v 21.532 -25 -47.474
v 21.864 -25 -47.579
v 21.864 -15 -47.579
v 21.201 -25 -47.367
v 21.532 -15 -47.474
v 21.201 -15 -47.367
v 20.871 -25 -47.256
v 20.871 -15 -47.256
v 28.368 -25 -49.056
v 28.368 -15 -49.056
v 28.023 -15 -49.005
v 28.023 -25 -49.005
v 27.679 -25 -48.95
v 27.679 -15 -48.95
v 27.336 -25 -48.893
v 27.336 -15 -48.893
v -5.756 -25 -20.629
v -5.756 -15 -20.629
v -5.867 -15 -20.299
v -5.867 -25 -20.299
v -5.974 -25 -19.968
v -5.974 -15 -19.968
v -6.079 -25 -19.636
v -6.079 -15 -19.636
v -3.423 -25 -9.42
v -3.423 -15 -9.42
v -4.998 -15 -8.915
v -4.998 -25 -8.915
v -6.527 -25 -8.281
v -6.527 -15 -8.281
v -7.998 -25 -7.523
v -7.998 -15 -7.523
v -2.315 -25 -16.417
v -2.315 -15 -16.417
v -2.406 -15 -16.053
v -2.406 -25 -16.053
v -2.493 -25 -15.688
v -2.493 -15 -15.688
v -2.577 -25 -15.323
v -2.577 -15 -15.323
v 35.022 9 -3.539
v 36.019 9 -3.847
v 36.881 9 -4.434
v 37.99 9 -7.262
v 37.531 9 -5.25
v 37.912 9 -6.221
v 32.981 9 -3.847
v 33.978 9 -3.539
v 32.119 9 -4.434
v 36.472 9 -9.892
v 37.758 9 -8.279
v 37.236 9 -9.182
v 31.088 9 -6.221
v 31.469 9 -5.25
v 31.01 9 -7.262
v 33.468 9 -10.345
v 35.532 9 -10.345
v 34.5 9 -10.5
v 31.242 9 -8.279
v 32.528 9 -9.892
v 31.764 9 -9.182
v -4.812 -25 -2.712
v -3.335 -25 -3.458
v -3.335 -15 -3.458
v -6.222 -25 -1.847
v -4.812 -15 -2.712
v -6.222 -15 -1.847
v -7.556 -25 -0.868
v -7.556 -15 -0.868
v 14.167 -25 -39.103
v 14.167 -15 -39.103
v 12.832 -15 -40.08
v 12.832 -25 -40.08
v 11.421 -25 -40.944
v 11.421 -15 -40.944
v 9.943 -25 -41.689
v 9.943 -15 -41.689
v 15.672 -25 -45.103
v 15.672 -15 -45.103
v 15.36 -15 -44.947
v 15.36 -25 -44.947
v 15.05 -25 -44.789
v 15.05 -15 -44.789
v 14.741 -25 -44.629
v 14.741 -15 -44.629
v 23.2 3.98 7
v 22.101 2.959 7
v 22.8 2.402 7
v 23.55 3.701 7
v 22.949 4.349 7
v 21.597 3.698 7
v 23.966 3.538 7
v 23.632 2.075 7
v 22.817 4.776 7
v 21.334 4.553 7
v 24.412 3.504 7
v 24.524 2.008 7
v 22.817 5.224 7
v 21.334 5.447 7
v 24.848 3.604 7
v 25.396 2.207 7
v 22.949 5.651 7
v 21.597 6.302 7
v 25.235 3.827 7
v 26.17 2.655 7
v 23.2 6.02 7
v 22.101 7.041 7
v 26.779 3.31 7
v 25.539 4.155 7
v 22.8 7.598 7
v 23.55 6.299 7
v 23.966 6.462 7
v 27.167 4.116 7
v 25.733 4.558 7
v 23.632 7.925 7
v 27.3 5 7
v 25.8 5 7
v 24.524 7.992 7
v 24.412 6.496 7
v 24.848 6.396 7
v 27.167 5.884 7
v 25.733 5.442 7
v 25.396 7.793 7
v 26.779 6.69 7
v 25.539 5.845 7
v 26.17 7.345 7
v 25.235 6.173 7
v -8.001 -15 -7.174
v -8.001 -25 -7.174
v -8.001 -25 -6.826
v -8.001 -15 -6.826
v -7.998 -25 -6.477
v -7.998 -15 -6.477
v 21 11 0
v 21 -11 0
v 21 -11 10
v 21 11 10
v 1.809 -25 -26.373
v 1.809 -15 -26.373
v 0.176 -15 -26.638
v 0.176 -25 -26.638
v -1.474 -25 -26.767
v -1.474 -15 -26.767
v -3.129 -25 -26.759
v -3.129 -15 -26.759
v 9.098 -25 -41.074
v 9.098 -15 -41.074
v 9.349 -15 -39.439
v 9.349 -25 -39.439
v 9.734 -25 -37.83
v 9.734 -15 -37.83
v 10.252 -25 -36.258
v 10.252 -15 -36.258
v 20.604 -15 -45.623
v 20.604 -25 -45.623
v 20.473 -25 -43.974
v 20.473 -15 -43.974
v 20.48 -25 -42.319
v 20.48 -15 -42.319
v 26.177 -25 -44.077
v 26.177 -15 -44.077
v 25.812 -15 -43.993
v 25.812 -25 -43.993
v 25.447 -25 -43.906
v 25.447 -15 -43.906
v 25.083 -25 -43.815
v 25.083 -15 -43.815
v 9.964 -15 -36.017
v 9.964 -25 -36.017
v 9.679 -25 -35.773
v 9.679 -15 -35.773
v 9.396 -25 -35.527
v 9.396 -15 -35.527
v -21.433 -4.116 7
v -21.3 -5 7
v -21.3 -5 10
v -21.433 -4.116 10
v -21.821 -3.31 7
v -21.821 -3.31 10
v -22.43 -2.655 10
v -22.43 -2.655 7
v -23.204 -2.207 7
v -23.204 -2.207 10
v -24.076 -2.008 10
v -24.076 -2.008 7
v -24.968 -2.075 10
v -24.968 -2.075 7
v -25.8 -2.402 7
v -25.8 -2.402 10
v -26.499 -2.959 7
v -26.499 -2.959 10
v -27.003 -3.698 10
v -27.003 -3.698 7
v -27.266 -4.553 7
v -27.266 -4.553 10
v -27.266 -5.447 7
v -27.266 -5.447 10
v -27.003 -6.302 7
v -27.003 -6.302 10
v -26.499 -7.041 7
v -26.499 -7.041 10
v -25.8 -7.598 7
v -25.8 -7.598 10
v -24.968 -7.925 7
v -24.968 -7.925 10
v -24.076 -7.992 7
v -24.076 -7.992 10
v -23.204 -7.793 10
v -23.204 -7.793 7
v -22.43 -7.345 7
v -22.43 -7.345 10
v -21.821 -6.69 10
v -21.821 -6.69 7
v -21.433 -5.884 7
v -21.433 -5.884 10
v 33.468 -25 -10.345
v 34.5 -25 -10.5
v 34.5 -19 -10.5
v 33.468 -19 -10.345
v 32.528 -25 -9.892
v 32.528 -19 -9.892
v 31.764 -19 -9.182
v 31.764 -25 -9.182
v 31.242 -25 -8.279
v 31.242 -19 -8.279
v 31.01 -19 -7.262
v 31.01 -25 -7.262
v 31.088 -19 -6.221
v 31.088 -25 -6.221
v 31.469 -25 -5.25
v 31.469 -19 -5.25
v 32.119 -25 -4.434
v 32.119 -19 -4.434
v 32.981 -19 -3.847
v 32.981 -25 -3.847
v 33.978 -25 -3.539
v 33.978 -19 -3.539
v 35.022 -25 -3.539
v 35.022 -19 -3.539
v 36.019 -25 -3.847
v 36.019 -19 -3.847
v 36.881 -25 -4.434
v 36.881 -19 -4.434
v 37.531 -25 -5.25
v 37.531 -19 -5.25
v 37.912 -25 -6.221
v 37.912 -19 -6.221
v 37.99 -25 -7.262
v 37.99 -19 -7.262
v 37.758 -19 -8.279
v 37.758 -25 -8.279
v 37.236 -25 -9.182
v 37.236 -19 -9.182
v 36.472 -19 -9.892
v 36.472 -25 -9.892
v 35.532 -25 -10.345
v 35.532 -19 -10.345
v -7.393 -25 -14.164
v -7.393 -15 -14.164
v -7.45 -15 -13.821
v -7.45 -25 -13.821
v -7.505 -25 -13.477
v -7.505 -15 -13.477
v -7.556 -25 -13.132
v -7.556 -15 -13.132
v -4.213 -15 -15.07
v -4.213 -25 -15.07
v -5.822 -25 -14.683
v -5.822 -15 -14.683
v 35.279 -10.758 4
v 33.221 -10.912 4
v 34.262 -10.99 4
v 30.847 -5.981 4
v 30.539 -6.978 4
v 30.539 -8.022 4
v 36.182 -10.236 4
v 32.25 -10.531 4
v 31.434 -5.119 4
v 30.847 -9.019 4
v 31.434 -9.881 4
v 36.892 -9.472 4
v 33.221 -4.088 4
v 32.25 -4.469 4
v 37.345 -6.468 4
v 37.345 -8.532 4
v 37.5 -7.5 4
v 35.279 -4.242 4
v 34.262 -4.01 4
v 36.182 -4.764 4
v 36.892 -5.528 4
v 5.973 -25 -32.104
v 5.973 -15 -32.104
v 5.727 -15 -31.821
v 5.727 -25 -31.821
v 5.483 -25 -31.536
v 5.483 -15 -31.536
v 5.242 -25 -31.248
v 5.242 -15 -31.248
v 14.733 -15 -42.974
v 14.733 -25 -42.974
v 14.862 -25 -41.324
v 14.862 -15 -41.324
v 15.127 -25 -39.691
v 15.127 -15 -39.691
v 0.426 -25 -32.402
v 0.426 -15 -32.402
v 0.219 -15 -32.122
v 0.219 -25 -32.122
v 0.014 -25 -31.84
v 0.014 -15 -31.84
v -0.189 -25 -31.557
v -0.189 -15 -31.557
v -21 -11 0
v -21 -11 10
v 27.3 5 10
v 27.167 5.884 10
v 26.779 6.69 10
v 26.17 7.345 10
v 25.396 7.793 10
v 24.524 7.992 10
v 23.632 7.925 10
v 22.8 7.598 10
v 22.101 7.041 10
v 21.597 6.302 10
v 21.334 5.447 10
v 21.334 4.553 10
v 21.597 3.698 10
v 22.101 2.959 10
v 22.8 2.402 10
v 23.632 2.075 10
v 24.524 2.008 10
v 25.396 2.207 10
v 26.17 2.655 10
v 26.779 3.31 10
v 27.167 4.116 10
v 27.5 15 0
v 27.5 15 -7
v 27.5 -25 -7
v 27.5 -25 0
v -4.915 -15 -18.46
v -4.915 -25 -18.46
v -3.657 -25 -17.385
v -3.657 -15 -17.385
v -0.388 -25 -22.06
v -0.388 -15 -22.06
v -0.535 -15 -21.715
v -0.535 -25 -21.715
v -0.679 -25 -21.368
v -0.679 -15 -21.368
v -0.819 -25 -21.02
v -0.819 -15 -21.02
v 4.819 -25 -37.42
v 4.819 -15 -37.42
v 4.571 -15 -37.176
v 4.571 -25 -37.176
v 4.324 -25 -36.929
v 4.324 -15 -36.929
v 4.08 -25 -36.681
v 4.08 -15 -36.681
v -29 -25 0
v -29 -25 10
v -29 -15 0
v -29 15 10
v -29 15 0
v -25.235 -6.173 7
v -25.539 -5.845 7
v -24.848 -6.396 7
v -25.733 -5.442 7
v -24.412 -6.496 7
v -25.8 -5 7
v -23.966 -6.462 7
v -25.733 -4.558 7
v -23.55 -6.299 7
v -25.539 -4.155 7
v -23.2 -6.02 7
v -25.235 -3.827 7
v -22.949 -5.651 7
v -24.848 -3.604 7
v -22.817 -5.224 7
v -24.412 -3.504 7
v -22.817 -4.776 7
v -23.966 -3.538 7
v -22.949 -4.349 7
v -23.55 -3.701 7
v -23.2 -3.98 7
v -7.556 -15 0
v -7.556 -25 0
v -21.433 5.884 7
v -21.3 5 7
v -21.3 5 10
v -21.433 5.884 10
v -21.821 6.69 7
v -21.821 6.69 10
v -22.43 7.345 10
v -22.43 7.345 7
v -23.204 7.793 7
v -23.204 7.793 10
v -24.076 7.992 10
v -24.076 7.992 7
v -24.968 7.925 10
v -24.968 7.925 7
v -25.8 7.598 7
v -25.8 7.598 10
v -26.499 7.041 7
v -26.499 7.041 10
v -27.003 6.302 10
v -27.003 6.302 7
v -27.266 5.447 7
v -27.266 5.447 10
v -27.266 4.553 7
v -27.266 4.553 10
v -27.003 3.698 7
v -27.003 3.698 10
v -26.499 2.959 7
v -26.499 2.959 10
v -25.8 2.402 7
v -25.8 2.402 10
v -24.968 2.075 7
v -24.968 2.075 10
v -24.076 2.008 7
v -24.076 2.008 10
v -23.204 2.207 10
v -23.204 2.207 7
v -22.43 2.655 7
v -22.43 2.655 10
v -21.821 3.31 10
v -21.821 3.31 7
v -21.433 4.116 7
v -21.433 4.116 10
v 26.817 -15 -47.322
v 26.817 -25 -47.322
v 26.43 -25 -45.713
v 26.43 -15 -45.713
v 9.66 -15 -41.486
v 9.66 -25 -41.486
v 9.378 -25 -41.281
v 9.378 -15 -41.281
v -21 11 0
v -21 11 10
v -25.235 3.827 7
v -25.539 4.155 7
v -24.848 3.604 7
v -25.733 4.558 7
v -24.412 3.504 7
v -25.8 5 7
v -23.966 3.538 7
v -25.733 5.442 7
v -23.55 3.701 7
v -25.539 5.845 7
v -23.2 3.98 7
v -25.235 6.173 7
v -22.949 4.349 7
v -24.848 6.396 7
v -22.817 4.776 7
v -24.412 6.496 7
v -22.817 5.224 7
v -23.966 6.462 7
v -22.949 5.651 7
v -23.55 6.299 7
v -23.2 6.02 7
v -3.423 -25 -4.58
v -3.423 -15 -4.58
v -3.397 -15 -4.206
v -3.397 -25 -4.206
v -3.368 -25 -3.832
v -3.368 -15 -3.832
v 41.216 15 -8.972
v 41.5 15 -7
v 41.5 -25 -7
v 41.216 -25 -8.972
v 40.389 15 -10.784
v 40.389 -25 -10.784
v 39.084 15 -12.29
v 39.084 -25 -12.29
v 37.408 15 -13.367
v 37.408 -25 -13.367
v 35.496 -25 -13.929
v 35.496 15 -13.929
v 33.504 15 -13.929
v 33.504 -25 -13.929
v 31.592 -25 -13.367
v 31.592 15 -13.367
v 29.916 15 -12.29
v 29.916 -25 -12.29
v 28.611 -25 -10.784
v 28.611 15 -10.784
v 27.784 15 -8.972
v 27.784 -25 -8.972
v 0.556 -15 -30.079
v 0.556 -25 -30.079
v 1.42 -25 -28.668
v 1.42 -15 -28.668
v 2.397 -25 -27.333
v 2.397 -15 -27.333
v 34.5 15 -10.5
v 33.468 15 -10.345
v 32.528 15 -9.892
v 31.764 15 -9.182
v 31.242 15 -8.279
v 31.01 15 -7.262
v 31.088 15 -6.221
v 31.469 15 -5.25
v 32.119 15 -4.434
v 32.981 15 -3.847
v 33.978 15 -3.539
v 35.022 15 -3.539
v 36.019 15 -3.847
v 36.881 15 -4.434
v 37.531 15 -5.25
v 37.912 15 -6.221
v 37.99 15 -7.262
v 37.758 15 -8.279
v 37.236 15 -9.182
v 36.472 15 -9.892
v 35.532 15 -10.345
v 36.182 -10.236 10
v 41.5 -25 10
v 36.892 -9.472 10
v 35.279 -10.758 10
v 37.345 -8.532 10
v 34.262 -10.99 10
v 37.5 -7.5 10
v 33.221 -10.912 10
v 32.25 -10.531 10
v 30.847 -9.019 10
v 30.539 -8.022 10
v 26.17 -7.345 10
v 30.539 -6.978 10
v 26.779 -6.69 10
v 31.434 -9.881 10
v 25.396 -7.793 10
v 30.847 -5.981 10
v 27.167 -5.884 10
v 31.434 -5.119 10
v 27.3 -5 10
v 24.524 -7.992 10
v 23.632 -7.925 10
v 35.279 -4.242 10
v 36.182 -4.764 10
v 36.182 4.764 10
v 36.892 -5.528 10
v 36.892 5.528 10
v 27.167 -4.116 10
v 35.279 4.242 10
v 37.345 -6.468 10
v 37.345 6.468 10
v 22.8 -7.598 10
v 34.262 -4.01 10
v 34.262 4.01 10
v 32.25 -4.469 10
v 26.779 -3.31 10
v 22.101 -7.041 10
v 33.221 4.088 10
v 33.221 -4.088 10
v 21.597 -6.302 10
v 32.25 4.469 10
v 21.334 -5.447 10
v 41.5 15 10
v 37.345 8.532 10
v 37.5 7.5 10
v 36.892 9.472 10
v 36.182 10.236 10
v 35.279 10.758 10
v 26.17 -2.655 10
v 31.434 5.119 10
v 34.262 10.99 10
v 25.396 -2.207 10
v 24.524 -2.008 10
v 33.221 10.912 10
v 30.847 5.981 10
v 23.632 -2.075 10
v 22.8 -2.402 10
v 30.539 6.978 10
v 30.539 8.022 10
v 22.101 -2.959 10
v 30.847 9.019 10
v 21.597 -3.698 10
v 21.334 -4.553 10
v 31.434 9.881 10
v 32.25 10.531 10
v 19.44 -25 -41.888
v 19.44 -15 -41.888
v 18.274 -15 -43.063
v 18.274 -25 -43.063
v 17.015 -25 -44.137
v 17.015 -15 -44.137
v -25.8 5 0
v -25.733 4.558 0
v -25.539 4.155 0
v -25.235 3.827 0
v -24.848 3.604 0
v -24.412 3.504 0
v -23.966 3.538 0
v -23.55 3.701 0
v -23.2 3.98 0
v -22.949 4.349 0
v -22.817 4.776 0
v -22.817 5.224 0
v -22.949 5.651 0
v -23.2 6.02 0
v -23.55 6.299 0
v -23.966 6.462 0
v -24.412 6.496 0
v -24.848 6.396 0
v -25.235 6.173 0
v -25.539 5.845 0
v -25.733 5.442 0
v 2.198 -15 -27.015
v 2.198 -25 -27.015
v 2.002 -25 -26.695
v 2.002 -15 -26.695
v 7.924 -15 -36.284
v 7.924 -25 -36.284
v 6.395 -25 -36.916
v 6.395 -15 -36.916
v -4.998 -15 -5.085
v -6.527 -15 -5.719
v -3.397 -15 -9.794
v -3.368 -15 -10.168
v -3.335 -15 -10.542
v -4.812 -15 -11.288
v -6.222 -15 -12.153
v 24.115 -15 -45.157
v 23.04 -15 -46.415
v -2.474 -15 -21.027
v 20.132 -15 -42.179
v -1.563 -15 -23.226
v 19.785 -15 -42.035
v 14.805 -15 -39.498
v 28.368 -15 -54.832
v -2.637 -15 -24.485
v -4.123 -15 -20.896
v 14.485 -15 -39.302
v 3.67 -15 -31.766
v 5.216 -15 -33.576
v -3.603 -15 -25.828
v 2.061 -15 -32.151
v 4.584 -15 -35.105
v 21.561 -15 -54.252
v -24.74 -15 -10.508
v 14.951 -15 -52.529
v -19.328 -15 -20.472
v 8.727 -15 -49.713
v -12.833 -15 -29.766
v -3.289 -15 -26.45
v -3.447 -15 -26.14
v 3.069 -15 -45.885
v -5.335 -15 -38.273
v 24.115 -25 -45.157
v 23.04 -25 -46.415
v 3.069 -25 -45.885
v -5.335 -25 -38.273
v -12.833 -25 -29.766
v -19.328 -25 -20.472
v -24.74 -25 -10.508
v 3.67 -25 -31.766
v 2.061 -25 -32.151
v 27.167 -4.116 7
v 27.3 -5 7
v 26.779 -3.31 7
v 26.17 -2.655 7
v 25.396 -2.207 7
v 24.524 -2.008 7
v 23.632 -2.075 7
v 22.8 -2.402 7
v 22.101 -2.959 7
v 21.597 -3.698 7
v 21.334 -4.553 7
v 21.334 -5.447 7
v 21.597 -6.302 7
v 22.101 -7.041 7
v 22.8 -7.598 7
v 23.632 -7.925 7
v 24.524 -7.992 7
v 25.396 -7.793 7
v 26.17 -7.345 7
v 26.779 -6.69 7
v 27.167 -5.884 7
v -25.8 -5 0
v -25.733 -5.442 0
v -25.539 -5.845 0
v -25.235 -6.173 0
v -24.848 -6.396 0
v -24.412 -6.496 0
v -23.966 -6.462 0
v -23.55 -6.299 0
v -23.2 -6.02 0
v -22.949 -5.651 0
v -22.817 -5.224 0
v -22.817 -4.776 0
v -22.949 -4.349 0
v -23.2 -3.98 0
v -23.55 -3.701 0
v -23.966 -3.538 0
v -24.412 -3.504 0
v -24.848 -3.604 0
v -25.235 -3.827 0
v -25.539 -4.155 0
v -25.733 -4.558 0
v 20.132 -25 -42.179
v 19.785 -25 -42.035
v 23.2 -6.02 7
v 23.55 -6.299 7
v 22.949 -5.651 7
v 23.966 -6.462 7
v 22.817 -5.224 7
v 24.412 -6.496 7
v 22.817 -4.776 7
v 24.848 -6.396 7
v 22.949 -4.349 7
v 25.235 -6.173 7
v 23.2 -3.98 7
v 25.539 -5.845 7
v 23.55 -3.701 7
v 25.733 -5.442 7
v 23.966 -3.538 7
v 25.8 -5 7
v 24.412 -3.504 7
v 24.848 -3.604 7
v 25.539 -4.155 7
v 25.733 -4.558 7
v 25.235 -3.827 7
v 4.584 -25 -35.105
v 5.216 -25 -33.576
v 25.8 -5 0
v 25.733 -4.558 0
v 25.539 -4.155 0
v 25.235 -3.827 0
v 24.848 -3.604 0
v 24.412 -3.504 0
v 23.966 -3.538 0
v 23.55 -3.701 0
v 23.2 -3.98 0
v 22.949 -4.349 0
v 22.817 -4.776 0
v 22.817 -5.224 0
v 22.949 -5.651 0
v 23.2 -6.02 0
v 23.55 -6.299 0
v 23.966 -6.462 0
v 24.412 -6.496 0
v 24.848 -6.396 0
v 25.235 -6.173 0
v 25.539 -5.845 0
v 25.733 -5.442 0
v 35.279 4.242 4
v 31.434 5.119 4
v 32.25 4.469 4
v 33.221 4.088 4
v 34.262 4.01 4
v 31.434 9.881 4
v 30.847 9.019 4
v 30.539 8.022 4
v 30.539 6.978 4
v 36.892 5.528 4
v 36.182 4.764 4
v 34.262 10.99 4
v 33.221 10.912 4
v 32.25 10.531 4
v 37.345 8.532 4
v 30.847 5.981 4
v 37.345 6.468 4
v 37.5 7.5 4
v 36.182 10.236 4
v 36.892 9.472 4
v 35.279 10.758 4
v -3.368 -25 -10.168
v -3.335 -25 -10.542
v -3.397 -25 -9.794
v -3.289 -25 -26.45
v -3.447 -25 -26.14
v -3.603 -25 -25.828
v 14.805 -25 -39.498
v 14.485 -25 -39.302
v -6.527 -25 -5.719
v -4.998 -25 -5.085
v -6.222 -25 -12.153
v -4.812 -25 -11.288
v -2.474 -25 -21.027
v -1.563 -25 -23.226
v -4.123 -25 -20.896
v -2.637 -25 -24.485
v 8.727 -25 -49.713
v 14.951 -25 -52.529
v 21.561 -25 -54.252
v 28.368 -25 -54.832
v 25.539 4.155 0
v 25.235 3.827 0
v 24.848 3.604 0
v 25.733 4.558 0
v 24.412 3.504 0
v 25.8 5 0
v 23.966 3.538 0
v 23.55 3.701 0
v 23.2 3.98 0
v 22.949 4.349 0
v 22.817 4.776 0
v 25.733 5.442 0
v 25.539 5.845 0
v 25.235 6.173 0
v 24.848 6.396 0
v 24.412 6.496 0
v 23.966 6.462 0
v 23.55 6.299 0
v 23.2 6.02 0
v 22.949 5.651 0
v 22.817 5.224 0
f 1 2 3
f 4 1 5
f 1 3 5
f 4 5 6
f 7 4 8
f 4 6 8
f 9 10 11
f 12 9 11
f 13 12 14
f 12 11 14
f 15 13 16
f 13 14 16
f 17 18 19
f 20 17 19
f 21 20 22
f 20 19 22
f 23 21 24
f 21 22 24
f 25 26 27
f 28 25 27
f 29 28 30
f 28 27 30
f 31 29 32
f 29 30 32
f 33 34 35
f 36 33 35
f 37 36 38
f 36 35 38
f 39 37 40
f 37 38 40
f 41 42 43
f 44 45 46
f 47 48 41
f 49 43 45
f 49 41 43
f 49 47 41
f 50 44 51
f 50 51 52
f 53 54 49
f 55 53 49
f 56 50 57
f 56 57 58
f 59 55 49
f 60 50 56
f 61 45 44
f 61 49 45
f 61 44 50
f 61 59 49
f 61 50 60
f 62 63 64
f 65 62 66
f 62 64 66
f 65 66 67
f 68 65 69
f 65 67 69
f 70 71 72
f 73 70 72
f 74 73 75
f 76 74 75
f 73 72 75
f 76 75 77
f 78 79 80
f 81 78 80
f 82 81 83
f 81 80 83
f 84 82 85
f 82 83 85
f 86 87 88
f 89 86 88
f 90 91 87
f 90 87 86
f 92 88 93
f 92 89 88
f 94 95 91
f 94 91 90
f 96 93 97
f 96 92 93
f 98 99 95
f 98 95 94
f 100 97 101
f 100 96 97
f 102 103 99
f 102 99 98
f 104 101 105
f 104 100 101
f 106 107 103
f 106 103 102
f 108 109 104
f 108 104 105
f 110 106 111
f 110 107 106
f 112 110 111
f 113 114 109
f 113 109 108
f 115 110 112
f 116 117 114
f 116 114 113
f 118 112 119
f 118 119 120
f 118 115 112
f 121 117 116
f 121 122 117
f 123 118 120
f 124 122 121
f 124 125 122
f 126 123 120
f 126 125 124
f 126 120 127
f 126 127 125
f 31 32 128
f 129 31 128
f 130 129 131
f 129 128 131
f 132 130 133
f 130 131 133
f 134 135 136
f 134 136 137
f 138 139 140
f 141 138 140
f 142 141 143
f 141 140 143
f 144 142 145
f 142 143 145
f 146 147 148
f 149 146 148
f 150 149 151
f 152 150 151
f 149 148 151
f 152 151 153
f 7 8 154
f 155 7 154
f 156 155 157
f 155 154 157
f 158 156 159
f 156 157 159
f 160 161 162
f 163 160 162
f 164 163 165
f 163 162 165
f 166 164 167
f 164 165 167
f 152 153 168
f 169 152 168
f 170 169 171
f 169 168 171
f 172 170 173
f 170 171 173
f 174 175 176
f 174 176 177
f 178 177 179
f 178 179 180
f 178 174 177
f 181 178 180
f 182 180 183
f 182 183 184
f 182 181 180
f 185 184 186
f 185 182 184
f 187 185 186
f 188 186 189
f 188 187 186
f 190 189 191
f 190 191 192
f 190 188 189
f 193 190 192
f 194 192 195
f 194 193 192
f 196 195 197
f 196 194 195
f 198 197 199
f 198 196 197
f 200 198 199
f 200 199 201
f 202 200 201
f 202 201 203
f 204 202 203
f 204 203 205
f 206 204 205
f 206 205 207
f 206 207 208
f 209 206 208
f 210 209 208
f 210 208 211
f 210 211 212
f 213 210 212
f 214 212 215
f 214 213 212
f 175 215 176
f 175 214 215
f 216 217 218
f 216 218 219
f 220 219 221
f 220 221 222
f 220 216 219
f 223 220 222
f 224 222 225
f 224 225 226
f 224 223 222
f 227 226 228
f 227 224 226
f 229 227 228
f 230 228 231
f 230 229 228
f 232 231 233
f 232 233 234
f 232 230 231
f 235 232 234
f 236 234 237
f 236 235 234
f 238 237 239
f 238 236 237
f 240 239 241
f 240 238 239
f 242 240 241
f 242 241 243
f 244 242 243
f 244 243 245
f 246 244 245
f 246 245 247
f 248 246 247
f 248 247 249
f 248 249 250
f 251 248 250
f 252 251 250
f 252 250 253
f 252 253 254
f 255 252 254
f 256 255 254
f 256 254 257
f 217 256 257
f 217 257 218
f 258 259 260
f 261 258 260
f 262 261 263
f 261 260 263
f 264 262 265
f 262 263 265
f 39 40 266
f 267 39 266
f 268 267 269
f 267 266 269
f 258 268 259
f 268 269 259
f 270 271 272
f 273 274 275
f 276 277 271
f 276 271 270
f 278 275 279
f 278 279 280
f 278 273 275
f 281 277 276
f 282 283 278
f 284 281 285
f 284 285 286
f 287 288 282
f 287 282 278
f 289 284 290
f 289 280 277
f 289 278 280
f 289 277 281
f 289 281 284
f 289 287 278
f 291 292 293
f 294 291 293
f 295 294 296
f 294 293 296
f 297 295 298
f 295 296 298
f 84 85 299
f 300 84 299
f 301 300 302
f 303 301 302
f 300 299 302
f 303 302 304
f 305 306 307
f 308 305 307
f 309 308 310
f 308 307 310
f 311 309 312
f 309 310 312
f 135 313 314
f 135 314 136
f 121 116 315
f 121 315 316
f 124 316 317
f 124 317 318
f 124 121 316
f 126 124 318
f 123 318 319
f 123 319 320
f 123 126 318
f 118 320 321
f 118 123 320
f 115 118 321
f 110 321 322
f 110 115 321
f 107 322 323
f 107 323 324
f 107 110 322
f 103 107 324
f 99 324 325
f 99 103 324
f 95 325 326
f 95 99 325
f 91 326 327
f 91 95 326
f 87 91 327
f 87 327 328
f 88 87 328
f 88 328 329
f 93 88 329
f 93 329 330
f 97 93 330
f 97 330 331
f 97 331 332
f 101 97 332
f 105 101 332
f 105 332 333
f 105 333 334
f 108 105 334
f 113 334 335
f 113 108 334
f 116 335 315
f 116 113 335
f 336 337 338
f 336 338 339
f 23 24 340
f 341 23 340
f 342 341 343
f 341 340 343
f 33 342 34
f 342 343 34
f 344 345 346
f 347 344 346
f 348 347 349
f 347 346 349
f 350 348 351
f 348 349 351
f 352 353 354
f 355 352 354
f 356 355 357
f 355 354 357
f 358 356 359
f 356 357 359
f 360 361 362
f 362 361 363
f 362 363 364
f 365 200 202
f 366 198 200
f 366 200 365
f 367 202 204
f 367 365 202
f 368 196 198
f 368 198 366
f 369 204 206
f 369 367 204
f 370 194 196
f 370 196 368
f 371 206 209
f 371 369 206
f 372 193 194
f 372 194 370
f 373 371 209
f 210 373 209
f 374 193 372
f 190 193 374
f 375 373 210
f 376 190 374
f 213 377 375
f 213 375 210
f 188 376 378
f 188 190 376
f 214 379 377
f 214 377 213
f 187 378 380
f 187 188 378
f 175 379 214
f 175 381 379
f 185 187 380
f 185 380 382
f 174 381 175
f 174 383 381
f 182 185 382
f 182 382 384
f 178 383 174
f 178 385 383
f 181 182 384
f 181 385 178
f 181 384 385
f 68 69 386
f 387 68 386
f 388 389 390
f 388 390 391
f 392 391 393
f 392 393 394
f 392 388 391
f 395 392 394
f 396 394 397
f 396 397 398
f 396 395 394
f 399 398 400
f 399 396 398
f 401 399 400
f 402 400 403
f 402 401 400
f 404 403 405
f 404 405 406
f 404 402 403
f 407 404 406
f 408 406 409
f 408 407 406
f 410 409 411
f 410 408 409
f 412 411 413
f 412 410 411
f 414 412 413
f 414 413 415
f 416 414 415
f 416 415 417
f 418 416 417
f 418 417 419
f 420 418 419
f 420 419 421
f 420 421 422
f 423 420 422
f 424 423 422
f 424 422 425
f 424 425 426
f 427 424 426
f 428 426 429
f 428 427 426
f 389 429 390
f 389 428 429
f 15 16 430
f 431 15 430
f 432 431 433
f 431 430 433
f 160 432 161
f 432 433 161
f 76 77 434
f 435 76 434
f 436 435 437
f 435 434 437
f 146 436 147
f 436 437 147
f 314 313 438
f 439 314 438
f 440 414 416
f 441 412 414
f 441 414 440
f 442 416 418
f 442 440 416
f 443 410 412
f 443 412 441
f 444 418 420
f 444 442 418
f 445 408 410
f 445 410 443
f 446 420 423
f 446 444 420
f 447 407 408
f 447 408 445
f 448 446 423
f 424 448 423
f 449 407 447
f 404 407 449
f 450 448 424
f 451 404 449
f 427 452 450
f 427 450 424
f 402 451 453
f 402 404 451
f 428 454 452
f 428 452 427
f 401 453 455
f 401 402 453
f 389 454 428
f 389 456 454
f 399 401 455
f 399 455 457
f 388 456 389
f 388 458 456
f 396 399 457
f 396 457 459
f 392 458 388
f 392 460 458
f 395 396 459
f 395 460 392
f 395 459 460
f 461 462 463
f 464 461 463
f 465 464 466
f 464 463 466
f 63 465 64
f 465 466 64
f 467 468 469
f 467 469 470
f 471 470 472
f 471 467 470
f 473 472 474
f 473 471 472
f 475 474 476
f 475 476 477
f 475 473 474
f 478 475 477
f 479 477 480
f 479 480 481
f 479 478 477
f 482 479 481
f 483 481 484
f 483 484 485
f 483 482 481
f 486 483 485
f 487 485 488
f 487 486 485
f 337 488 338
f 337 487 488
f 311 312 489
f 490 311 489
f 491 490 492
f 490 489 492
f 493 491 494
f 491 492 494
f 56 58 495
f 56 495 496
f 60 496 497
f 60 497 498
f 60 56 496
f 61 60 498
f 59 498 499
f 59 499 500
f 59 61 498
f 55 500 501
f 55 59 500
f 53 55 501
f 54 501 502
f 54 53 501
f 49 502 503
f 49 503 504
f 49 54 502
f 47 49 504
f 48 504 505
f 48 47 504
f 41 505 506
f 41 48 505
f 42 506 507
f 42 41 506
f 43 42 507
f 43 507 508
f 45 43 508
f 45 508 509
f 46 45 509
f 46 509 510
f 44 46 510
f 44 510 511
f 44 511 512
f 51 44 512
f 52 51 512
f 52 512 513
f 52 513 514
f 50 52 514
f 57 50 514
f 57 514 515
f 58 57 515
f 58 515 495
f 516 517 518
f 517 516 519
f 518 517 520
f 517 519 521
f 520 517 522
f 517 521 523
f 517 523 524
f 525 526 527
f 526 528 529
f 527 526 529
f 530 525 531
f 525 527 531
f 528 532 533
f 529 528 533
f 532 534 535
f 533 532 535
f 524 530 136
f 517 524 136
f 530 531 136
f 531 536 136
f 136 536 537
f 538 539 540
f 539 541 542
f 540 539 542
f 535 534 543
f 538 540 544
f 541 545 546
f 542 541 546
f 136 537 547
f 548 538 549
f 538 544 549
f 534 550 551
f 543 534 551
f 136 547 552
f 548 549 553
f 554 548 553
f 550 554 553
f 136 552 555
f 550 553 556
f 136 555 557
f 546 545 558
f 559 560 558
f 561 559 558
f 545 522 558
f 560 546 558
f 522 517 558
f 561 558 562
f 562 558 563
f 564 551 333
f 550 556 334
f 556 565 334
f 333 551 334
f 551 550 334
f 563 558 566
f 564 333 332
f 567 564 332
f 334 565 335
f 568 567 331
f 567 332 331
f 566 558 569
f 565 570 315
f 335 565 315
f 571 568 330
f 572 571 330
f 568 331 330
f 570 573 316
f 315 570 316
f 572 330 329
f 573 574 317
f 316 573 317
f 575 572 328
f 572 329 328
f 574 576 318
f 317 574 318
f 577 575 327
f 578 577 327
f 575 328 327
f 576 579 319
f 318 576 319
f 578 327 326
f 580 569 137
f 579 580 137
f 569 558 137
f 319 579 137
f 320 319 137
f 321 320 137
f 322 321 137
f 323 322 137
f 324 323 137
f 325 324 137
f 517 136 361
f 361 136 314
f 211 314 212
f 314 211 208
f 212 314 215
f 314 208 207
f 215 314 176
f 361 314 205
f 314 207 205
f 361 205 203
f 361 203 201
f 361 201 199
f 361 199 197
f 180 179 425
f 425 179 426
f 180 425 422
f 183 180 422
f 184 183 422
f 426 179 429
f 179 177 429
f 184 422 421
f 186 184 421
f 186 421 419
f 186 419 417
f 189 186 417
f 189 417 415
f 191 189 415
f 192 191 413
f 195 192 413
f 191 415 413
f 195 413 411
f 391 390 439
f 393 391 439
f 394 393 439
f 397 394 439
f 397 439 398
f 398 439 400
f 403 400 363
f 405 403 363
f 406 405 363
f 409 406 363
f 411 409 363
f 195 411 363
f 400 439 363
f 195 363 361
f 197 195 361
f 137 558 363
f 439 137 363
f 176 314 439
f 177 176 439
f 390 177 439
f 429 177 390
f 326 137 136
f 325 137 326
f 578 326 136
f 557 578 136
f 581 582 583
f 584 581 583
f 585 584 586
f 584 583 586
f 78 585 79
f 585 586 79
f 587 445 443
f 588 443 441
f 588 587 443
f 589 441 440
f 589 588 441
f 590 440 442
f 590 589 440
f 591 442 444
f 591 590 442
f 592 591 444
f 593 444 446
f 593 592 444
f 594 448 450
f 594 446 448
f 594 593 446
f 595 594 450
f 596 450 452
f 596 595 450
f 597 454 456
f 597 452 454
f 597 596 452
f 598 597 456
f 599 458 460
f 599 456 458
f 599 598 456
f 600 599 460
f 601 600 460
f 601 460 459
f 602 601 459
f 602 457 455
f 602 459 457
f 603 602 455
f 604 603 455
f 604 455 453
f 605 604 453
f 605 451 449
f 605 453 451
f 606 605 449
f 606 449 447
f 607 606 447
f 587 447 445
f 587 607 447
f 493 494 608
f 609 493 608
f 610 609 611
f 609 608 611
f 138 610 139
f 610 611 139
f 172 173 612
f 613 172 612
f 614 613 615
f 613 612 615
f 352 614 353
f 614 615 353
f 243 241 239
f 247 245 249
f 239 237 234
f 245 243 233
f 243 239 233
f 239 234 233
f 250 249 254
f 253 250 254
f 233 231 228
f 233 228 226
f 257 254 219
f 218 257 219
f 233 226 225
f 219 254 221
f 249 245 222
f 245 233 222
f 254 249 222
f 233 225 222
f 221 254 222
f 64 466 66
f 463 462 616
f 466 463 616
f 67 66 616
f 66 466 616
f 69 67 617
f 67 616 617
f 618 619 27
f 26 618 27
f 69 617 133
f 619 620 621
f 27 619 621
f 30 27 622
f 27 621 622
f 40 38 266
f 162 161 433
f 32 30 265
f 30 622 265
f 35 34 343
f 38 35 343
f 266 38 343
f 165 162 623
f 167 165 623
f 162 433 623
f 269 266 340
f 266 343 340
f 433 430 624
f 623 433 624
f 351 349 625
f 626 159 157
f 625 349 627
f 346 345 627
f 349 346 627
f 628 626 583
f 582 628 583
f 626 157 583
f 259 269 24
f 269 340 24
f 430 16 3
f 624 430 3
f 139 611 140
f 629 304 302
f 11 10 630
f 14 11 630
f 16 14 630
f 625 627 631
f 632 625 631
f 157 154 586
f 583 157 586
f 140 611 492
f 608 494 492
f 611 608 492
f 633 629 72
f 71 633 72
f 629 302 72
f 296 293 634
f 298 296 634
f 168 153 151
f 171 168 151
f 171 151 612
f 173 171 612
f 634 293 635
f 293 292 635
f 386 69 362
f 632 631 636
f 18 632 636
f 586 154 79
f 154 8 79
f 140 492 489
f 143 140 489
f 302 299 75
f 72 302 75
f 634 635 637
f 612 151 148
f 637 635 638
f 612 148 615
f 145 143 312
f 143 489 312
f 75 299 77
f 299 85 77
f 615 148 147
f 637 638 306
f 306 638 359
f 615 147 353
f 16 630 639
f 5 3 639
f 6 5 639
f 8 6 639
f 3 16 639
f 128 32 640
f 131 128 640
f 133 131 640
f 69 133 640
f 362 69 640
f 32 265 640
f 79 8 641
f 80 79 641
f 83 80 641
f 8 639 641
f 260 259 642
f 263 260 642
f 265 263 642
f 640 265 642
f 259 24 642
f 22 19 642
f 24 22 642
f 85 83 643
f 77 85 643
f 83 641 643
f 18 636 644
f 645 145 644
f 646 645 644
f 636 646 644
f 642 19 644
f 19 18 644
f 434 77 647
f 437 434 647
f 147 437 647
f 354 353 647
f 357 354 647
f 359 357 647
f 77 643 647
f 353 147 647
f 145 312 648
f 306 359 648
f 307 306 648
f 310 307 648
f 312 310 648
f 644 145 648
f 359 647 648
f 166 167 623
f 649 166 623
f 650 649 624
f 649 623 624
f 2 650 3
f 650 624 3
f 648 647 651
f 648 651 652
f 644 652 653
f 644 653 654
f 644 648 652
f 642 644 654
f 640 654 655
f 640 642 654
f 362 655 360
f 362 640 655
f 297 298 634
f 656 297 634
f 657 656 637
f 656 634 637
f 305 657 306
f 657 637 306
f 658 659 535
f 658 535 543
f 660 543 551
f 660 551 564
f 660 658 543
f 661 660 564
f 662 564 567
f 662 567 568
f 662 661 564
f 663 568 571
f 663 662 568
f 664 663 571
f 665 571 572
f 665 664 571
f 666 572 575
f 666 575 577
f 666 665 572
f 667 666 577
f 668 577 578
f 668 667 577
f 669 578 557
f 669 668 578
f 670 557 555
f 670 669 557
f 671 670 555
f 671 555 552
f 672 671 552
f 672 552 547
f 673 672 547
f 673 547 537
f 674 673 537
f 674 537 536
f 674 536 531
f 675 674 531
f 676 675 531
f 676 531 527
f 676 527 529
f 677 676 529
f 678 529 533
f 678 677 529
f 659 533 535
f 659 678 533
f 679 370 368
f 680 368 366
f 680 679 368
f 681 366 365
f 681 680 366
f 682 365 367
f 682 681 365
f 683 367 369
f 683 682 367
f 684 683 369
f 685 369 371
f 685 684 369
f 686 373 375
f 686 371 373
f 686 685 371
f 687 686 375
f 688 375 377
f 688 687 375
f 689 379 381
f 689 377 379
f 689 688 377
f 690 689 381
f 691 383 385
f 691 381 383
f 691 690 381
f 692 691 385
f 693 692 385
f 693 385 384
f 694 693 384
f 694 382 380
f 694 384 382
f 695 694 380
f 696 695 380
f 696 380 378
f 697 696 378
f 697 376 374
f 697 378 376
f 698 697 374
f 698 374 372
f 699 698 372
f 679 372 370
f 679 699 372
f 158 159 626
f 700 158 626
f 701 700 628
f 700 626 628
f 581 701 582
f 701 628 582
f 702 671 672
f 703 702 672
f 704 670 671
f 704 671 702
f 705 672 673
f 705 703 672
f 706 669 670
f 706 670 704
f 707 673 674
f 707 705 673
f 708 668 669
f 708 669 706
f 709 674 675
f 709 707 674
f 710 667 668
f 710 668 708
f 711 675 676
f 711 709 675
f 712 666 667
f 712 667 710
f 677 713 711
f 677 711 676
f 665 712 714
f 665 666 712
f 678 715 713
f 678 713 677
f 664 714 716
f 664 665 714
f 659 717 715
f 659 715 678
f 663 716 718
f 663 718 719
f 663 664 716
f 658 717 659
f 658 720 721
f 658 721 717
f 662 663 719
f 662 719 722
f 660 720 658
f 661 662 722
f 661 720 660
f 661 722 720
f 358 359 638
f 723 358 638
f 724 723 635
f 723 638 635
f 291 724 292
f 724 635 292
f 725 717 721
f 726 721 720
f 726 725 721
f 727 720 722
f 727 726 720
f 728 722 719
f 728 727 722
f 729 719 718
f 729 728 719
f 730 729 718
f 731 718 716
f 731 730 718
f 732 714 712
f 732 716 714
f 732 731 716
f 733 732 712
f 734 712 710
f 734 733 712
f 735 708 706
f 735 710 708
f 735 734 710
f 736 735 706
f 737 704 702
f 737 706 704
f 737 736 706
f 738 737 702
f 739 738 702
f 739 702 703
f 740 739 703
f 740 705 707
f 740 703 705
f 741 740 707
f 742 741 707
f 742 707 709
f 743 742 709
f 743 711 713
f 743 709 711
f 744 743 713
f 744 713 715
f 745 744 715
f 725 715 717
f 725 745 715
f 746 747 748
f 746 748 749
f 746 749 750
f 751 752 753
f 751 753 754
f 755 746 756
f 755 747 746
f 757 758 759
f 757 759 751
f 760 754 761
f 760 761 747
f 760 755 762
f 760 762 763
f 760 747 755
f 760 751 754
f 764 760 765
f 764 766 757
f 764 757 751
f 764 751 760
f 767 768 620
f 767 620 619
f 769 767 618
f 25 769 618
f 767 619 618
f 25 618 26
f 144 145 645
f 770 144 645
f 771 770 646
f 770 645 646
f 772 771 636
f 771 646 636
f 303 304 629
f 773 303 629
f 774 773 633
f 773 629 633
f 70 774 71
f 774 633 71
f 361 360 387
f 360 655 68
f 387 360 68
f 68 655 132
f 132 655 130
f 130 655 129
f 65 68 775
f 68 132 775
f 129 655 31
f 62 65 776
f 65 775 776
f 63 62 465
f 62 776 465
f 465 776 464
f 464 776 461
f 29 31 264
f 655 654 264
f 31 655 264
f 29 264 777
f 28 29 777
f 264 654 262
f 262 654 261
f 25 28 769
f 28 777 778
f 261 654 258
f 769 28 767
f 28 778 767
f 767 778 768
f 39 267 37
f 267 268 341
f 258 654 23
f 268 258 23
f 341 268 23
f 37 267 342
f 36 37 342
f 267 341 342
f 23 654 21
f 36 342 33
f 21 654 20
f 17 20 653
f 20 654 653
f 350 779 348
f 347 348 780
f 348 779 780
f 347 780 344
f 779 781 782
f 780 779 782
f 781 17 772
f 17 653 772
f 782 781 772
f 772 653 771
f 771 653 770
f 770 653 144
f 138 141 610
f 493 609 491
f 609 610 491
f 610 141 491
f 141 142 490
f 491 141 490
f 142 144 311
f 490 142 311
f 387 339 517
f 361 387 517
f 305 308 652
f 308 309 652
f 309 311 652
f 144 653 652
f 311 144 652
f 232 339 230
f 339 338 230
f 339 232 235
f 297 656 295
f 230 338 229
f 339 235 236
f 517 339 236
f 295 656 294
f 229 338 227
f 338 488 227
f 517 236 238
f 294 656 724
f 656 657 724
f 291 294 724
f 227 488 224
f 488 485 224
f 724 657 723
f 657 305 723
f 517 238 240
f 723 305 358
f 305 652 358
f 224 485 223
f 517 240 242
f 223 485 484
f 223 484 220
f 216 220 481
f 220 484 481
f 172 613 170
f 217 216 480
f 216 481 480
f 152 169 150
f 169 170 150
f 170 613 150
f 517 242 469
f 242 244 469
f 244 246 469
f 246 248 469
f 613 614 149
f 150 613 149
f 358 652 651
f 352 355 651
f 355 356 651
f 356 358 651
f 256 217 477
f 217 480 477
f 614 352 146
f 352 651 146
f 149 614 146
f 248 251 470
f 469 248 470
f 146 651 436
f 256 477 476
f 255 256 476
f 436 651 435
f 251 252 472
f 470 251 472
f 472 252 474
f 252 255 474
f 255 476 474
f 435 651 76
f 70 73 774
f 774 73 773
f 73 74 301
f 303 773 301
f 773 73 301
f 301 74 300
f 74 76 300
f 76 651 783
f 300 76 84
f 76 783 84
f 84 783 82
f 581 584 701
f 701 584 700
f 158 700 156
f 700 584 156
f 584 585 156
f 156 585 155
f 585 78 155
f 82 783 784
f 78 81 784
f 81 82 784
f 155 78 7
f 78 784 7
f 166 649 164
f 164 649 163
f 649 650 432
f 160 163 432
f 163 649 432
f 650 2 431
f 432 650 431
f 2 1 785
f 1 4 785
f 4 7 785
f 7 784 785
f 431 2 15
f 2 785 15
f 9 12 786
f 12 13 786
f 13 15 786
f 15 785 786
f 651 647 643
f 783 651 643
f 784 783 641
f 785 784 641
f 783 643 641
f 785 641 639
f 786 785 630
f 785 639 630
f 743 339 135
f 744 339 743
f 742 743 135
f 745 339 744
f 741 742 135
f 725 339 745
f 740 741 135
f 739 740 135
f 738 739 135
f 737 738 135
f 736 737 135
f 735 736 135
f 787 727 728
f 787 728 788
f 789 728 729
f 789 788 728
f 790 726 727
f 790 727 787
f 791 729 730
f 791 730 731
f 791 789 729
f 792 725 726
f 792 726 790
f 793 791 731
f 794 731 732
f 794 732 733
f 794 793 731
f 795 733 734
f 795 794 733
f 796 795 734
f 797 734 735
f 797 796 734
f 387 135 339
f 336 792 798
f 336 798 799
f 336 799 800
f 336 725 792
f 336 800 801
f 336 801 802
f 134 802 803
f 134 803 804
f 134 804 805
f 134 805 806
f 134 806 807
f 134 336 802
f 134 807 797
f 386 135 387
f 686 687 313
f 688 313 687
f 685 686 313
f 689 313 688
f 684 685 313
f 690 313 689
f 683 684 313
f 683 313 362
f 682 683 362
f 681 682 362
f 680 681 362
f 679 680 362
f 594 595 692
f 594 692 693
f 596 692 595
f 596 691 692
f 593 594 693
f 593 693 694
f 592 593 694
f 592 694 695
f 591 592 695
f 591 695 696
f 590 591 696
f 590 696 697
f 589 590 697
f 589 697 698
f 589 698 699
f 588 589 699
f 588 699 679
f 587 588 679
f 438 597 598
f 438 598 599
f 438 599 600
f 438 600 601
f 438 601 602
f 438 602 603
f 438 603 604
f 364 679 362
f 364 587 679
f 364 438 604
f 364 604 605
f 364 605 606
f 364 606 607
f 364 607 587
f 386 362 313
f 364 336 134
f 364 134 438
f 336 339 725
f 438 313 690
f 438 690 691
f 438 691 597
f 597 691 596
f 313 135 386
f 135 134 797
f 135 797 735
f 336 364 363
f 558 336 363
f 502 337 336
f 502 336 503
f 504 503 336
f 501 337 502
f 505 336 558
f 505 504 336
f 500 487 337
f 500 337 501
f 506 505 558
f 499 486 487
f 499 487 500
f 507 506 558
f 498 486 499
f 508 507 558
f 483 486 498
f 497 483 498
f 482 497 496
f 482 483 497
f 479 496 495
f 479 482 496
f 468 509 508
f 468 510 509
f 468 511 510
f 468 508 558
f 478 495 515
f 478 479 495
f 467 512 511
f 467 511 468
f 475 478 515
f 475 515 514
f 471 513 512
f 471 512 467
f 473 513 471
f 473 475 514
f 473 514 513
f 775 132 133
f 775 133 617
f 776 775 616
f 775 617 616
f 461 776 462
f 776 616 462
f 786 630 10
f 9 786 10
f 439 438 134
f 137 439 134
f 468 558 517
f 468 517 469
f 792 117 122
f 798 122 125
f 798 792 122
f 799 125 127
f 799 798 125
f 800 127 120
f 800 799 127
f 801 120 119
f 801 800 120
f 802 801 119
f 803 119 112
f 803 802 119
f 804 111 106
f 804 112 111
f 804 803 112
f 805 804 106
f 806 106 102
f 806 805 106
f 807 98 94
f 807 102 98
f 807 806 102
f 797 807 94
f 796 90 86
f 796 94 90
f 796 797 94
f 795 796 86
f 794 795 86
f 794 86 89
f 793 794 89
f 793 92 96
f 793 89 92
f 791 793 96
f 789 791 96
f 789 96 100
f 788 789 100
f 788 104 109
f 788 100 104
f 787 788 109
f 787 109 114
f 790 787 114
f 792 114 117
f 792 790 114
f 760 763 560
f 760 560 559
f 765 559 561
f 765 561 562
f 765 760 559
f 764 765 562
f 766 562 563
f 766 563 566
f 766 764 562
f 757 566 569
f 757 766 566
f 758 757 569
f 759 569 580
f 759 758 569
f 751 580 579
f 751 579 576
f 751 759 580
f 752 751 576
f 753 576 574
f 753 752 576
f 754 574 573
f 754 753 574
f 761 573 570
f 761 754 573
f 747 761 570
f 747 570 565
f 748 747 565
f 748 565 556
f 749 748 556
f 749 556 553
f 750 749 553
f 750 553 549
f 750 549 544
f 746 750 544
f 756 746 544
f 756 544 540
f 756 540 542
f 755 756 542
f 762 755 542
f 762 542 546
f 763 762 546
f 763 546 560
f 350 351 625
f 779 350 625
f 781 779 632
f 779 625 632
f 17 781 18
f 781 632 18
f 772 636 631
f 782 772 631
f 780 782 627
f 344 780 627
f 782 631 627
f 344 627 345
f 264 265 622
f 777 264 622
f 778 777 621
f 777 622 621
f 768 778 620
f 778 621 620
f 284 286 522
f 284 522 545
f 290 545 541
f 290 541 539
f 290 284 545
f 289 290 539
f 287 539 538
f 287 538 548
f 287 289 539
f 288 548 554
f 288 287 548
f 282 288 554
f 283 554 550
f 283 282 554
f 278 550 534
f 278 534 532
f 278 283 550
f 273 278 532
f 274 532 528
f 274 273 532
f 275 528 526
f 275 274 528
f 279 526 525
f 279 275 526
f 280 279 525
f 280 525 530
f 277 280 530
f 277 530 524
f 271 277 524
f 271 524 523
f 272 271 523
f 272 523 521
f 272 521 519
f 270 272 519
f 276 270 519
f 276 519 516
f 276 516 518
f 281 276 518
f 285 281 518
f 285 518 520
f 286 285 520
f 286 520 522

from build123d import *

# Parameters (mm, degrees)
SKETCH1_R                = 3.5
SKETCH1_R_2              = 1.5
SKETCH1_W                = 42
SKETCH1_H                = 22
BOSS_EXTRUDE1_DEPTH      = 10
CUT_EXTRUDE1_START       = 7
SKETCH2_R                = 3
CUT_EXTRUDE1_DEPTH       = 3
BOSS_EXTRUDE2_START      = -15
SKETCH4_R                = 5
BOSS_EXTRUDE2_DEPTH      = 10
BOSS_EXTRUDE3_DEPTH      = 15
BOSS_EXTRUDE3_DEPTH_BACK = 25
SKETCH4_3_R              = 5
SKETCH1_3_R              = 3.5
BOSS_EXTRUDE4_DEPTH      = 4
BOSS_EXTRUDE5_START      = -15
BOSS_EXTRUDE5_DEPTH      = 10
BOSS_EXTRUDE6_DEPTH      = 15
BOSS_EXTRUDE6_DEPTH_BACK = 25
SKETCH6_R                = 5
SKETCH6_R_2              = 3.5
BOSS_EXTRUDE7_START      = -19
SKETCH6_2_R              = 3.5
BOSS_EXTRUDE7_DEPTH      = 28


with BuildPart() as part:
    # Sketch1 → Boss-Extrude1 (new body)
    with BuildSketch(Plane.XY):
        Polygon((34, -15), (-29, -15), (-29, 15), (34, 15), (41.5, 15), (41.5, 7.5), (41.5, -7.5), (41.5, -15), align=None)
        with Locations((34, -7.5)):
            Circle(SKETCH1_R, mode=Mode.SUBTRACT)
        with Locations((34, 7.5)):
            Circle(SKETCH1_R, mode=Mode.SUBTRACT)
        with Locations((24.3, 5)):
            Circle(SKETCH1_R_2, mode=Mode.SUBTRACT)
        with Locations((24.3, -5)):
            Circle(SKETCH1_R_2, mode=Mode.SUBTRACT)
        with Locations(Location((-24.3, -5, 0), (0, 0, 180))):
            Circle(SKETCH1_R_2, mode=Mode.SUBTRACT)
        with Locations(Location((-24.3, 5, 0), (0, 0, 180))):
            Circle(SKETCH1_R_2, mode=Mode.SUBTRACT)
        Rectangle(SKETCH1_W, SKETCH1_H, mode=Mode.SUBTRACT)
    extrude(amount=BOSS_EXTRUDE1_DEPTH)

    # Sketch2 → Cut-Extrude1 (cut)
    with BuildSketch(Plane.XY.offset(CUT_EXTRUDE1_START)):
        with Locations((-24.3, 5)):
            Circle(SKETCH2_R)
        with Locations((-24.3, -5)):
            Circle(SKETCH2_R)
        with Locations((24.3, 5)):
            Circle(SKETCH2_R)
        with Locations((24.3, -5)):
            Circle(SKETCH2_R)
    extrude(amount=CUT_EXTRUDE1_DEPTH, mode=Mode.SUBTRACT)

    # Sketch4 → Boss-Extrude2 (add)
    # profile 1 of 3: a face of its own
    with BuildSketch(Plane(origin=(0, 0, 0), x_dir=(1, 0, 0), z_dir=(0, 1, 0)).offset(BOSS_EXTRUDE2_START)):
        with BuildLine():
            Line((41.5, 0), (41.5, 7))
            ThreePointArc((41.5, 7), (34.5, 14), (27.5, 7))
            Line((27.5, 7), (27.5, 0))
            Line((27.5, 0), (41.5, 0))
        make_face()
        with Locations((34.5, 7)):
            Circle(SKETCH4_R, mode=Mode.SUBTRACT)
    # profile 2 of 3: a face of its own
    with BuildSketch(Plane(origin=(0, 0, 0), x_dir=(1, 0, 0), z_dir=(0, 1, 0)).offset(BOSS_EXTRUDE2_START)):
        Polygon((-29, -10), (-29, 0), (27.5, 0), (41.5, 0), (41.5, -10), align=None)
    # profile 3 of 3: a face of its own
    with BuildSketch(Plane(origin=(0, 0, 0), x_dir=(1, 0, 0), z_dir=(0, 1, 0)).offset(BOSS_EXTRUDE2_START)):
        with BuildLine():
            Line((-29, 0), (-9.952221542, 0))
            ThreePointArc((-9.952221542, 0), (-7.49675311, 23.163932944), (6.211711403, 41.99675311))
            Line((6.211711403, 41.99675311), (3.068568225, 45.885281233))
            ThreePointArc((3.068568225, 45.885281233), (-16.210887038, 25.210644422), (-29, 0))
        make_face()
    extrude(amount=-BOSS_EXTRUDE2_DEPTH)

    # Sketch4<3> → Boss-Extrude3 (add, two sides: drawn at the far end of the back side and taken through both)
    with BuildSketch(Plane(origin=(0, 0, 0), x_dir=(1, 0, 0), z_dir=(0, 1, 0)).offset(-BOSS_EXTRUDE3_DEPTH_BACK)):
        with BuildLine():
            Line((41.5, 0), (41.5, 7))
            ThreePointArc((41.5, 7), (34.5, 14), (27.5, 7))
            Line((27.5, 7), (27.5, 0))
            Line((27.5, 0), (41.5, 0))
        make_face()
        with Locations((34.5, 7)):
            Circle(SKETCH4_3_R, mode=Mode.SUBTRACT)
    extrude(amount=BOSS_EXTRUDE3_DEPTH + BOSS_EXTRUDE3_DEPTH_BACK)

    # Sketch1<3> → Boss-Extrude4 (add)
    with BuildSketch(Plane.XY):
        with Locations((34, 7.5)):
            Circle(SKETCH1_3_R)
        with Locations((34, -7.5)):
            Circle(SKETCH1_3_R)
    extrude(amount=BOSS_EXTRUDE4_DEPTH)

    # Sketch5 → Boss-Extrude5 (add)
    with BuildSketch(Plane(origin=(0, 0, 0), x_dir=(1, 0, 0), z_dir=(0, 1, 0)).offset(BOSS_EXTRUDE5_START)):
        with BuildLine():
            Line((-7.556310354, 0), (-29, 0))
            ThreePointArc((-29, 0), (-16.210887038, 25.210644422), (3.068568225, 45.885281233))
            ThreePointArc((3.068568225, 45.885281233), (14.95066501, 52.529162568), (28.36797257, 54.831604973))
            Line((28.36797257, 54.831604973), (28.36797257, 51.580244948))
            Line((28.36797257, 51.580244948), (28.36797257, 49.056310354))
            ThreePointArc((28.36797257, 49.056310354), (27.851378801, 48.977742164), (27.335790025, 48.892828699))
            ThreePointArc((27.335790025, 48.892828699), (26.606861218, 46.521101207), (26.177213589, 44.077368115))
            ThreePointArc((26.177213589, 44.077368115), (25.629076173, 43.950056975), (25.082884112, 43.814642852))
            ThreePointArc((25.082884112, 43.814642852), (23.590633664, 45.796969038), (21.864411592, 47.579266955))
            ThreePointArc((21.864411592, 47.579266955), (21.366468722, 47.420852999), (20.870511092, 47.256329106))
            ThreePointArc((20.870511092, 47.256329106), (20.521576529, 44.799771926), (20.479502655, 42.318913548))
            ThreePointArc((20.479502655, 42.318913548), (19.95802957, 42.107422235), (19.439745475, 41.888232022))
            ThreePointArc((19.439745475, 41.888232022), (17.65576297, 43.612713083), (15.671980735, 45.103027328))
            ThreePointArc((15.671980735, 45.103027328), (15.204949771, 44.868668285), (14.740835409, 44.628585087))
            ThreePointArc((14.740835409, 44.628585087), (14.780487018, 42.147686811), (15.127022896, 39.690790112))
            ThreePointArc((15.127022896, 39.690790112), (14.645054541, 39.400326245), (14.167440286, 39.102757132))
            ThreePointArc((14.167440286, 39.102757132), (12.135653294, 40.526930621), (9.943158199, 41.688564712))
            ThreePointArc((9.943158199, 41.688564712), (9.518538992, 41.384031278), (9.097695935, 41.074300421))
            ThreePointArc((9.097695935, 41.074300421), (9.524957362, 38.630148998), (10.251570129, 36.257710929))
            ThreePointArc((10.251570129, 36.257710929), (9.820974163, 35.895426693), (9.395790198, 35.526805819))
            ThreePointArc((9.395790198, 35.526805819), (7.166228058, 36.615603857), (4.819006607, 37.419954507))
            ThreePointArc((4.819006607, 37.419954507), (4.447254693, 37.052745307), (4.080045493, 36.680993393))
            ThreePointArc((4.080045493, 36.680993393), (4.884396143, 34.333771942), (5.973194181, 32.104209802))
            ThreePointArc((5.973194181, 32.104209802), (5.604573307, 31.679025837), (5.242289071, 31.248429871))
            ThreePointArc((5.242289071, 31.248429871), (2.869851002, 31.975042638), (0.425699579, 32.402304065))
            ThreePointArc((0.425699579, 32.402304065), (0.115968722, 31.981461008), (-0.188564712, 31.556841801))
            ThreePointArc((-0.188564712, 31.556841801), (0.973069379, 29.364346706), (2.397242868, 27.332559714))
            ThreePointArc((2.397242868, 27.332559714), (2.099673755, 26.854945459), (1.809209888, 26.372977104))
            ThreePointArc((1.809209888, 26.372977104), (-0.647686811, 26.719512982), (-3.128585087, 26.759164591))
            ThreePointArc((-3.128585087, 26.759164591), (-3.368668285, 26.295050229), (-3.603027328, 25.828019265))
            ThreePointArc((-3.603027328, 25.828019265), (-2.112713083, 23.84423703), (-0.388232022, 22.060254525))
            ThreePointArc((-0.388232022, 22.060254525), (-0.607422235, 21.54197043), (-0.818913548, 21.020497345))
            ThreePointArc((-0.818913548, 21.020497345), (-3.299771926, 20.978423471), (-5.756329106, 20.629488908))
            ThreePointArc((-5.756329106, 20.629488908), (-5.920852999, 20.133531278), (-6.079266955, 19.635588408))
            ThreePointArc((-6.079266955, 19.635588408), (-4.296969038, 17.909366336), (-2.314642852, 16.417115888))
            ThreePointArc((-2.314642852, 16.417115888), (-2.450056975, 15.870923827), (-2.577368115, 15.322786411))
            ThreePointArc((-2.577368115, 15.322786411), (-5.021101207, 14.893138782), (-7.392828699, 14.164209975))
            ThreePointArc((-7.392828699, 14.164209975), (-7.477742164, 13.648621199), (-7.556310354, 13.13202743))
            ThreePointArc((-7.556310354, 13.13202743), (-5.525914856, 11.705870837), (-3.334554995, 10.542096605))
            ThreePointArc((-3.334554995, 10.542096605), (-3.382858682, 9.981445638), (-3.422854827, 9.420140853))
            ThreePointArc((-3.422854827, 9.420140853), (-5.769289812, 8.613498821), (-7.997787816, 7.522524415))
            ThreePointArc((-7.997787816, 7.522524415), (-8.001, 7), (-7.997787816, 6.477475585))
            ThreePointArc((-7.997787816, 6.477475585), (-5.769289812, 5.386501179), (-3.422854827, 4.579859147))
            ThreePointArc((-3.422854827, 4.579859147), (-3.382858682, 4.018554362), (-3.334554995, 3.457903395))
            ThreePointArc((-3.334554995, 3.457903395), (-5.525914856, 2.294129163), (-7.556310354, 0.86797257))
            Line((-7.556310354, 0.86797257), (-7.556310354, 0))
        make_face()
    extrude(amount=-BOSS_EXTRUDE5_DEPTH)

    # Sketch6 → Boss-Extrude6 (add, two sides: drawn at the far end of the back side and taken through both)
    with BuildSketch(Plane(origin=(0, 0, 0), x_dir=(1, 0, 0), z_dir=(0, 1, 0)).offset(-BOSS_EXTRUDE6_DEPTH_BACK)):
        with Locations((34.5, 7)):
            Circle(SKETCH6_R)
        with Locations(Location((34.5, 7, 0), (0, 0, 90))):
            Circle(SKETCH6_R_2, mode=Mode.SUBTRACT)
    extrude(amount=BOSS_EXTRUDE6_DEPTH + BOSS_EXTRUDE6_DEPTH_BACK)

    # Sketch6<2> → Boss-Extrude7 (add)
    with BuildSketch(Plane(origin=(0, 0, 0), x_dir=(1, 0, 0), z_dir=(0, 1, 0)).offset(BOSS_EXTRUDE7_START)):
        with Locations(Location((34.5, 7, 0), (0, 0, 90))):
            Circle(SKETCH6_2_R)
    extrude(amount=BOSS_EXTRUDE7_DEPTH)


solid = part.part
